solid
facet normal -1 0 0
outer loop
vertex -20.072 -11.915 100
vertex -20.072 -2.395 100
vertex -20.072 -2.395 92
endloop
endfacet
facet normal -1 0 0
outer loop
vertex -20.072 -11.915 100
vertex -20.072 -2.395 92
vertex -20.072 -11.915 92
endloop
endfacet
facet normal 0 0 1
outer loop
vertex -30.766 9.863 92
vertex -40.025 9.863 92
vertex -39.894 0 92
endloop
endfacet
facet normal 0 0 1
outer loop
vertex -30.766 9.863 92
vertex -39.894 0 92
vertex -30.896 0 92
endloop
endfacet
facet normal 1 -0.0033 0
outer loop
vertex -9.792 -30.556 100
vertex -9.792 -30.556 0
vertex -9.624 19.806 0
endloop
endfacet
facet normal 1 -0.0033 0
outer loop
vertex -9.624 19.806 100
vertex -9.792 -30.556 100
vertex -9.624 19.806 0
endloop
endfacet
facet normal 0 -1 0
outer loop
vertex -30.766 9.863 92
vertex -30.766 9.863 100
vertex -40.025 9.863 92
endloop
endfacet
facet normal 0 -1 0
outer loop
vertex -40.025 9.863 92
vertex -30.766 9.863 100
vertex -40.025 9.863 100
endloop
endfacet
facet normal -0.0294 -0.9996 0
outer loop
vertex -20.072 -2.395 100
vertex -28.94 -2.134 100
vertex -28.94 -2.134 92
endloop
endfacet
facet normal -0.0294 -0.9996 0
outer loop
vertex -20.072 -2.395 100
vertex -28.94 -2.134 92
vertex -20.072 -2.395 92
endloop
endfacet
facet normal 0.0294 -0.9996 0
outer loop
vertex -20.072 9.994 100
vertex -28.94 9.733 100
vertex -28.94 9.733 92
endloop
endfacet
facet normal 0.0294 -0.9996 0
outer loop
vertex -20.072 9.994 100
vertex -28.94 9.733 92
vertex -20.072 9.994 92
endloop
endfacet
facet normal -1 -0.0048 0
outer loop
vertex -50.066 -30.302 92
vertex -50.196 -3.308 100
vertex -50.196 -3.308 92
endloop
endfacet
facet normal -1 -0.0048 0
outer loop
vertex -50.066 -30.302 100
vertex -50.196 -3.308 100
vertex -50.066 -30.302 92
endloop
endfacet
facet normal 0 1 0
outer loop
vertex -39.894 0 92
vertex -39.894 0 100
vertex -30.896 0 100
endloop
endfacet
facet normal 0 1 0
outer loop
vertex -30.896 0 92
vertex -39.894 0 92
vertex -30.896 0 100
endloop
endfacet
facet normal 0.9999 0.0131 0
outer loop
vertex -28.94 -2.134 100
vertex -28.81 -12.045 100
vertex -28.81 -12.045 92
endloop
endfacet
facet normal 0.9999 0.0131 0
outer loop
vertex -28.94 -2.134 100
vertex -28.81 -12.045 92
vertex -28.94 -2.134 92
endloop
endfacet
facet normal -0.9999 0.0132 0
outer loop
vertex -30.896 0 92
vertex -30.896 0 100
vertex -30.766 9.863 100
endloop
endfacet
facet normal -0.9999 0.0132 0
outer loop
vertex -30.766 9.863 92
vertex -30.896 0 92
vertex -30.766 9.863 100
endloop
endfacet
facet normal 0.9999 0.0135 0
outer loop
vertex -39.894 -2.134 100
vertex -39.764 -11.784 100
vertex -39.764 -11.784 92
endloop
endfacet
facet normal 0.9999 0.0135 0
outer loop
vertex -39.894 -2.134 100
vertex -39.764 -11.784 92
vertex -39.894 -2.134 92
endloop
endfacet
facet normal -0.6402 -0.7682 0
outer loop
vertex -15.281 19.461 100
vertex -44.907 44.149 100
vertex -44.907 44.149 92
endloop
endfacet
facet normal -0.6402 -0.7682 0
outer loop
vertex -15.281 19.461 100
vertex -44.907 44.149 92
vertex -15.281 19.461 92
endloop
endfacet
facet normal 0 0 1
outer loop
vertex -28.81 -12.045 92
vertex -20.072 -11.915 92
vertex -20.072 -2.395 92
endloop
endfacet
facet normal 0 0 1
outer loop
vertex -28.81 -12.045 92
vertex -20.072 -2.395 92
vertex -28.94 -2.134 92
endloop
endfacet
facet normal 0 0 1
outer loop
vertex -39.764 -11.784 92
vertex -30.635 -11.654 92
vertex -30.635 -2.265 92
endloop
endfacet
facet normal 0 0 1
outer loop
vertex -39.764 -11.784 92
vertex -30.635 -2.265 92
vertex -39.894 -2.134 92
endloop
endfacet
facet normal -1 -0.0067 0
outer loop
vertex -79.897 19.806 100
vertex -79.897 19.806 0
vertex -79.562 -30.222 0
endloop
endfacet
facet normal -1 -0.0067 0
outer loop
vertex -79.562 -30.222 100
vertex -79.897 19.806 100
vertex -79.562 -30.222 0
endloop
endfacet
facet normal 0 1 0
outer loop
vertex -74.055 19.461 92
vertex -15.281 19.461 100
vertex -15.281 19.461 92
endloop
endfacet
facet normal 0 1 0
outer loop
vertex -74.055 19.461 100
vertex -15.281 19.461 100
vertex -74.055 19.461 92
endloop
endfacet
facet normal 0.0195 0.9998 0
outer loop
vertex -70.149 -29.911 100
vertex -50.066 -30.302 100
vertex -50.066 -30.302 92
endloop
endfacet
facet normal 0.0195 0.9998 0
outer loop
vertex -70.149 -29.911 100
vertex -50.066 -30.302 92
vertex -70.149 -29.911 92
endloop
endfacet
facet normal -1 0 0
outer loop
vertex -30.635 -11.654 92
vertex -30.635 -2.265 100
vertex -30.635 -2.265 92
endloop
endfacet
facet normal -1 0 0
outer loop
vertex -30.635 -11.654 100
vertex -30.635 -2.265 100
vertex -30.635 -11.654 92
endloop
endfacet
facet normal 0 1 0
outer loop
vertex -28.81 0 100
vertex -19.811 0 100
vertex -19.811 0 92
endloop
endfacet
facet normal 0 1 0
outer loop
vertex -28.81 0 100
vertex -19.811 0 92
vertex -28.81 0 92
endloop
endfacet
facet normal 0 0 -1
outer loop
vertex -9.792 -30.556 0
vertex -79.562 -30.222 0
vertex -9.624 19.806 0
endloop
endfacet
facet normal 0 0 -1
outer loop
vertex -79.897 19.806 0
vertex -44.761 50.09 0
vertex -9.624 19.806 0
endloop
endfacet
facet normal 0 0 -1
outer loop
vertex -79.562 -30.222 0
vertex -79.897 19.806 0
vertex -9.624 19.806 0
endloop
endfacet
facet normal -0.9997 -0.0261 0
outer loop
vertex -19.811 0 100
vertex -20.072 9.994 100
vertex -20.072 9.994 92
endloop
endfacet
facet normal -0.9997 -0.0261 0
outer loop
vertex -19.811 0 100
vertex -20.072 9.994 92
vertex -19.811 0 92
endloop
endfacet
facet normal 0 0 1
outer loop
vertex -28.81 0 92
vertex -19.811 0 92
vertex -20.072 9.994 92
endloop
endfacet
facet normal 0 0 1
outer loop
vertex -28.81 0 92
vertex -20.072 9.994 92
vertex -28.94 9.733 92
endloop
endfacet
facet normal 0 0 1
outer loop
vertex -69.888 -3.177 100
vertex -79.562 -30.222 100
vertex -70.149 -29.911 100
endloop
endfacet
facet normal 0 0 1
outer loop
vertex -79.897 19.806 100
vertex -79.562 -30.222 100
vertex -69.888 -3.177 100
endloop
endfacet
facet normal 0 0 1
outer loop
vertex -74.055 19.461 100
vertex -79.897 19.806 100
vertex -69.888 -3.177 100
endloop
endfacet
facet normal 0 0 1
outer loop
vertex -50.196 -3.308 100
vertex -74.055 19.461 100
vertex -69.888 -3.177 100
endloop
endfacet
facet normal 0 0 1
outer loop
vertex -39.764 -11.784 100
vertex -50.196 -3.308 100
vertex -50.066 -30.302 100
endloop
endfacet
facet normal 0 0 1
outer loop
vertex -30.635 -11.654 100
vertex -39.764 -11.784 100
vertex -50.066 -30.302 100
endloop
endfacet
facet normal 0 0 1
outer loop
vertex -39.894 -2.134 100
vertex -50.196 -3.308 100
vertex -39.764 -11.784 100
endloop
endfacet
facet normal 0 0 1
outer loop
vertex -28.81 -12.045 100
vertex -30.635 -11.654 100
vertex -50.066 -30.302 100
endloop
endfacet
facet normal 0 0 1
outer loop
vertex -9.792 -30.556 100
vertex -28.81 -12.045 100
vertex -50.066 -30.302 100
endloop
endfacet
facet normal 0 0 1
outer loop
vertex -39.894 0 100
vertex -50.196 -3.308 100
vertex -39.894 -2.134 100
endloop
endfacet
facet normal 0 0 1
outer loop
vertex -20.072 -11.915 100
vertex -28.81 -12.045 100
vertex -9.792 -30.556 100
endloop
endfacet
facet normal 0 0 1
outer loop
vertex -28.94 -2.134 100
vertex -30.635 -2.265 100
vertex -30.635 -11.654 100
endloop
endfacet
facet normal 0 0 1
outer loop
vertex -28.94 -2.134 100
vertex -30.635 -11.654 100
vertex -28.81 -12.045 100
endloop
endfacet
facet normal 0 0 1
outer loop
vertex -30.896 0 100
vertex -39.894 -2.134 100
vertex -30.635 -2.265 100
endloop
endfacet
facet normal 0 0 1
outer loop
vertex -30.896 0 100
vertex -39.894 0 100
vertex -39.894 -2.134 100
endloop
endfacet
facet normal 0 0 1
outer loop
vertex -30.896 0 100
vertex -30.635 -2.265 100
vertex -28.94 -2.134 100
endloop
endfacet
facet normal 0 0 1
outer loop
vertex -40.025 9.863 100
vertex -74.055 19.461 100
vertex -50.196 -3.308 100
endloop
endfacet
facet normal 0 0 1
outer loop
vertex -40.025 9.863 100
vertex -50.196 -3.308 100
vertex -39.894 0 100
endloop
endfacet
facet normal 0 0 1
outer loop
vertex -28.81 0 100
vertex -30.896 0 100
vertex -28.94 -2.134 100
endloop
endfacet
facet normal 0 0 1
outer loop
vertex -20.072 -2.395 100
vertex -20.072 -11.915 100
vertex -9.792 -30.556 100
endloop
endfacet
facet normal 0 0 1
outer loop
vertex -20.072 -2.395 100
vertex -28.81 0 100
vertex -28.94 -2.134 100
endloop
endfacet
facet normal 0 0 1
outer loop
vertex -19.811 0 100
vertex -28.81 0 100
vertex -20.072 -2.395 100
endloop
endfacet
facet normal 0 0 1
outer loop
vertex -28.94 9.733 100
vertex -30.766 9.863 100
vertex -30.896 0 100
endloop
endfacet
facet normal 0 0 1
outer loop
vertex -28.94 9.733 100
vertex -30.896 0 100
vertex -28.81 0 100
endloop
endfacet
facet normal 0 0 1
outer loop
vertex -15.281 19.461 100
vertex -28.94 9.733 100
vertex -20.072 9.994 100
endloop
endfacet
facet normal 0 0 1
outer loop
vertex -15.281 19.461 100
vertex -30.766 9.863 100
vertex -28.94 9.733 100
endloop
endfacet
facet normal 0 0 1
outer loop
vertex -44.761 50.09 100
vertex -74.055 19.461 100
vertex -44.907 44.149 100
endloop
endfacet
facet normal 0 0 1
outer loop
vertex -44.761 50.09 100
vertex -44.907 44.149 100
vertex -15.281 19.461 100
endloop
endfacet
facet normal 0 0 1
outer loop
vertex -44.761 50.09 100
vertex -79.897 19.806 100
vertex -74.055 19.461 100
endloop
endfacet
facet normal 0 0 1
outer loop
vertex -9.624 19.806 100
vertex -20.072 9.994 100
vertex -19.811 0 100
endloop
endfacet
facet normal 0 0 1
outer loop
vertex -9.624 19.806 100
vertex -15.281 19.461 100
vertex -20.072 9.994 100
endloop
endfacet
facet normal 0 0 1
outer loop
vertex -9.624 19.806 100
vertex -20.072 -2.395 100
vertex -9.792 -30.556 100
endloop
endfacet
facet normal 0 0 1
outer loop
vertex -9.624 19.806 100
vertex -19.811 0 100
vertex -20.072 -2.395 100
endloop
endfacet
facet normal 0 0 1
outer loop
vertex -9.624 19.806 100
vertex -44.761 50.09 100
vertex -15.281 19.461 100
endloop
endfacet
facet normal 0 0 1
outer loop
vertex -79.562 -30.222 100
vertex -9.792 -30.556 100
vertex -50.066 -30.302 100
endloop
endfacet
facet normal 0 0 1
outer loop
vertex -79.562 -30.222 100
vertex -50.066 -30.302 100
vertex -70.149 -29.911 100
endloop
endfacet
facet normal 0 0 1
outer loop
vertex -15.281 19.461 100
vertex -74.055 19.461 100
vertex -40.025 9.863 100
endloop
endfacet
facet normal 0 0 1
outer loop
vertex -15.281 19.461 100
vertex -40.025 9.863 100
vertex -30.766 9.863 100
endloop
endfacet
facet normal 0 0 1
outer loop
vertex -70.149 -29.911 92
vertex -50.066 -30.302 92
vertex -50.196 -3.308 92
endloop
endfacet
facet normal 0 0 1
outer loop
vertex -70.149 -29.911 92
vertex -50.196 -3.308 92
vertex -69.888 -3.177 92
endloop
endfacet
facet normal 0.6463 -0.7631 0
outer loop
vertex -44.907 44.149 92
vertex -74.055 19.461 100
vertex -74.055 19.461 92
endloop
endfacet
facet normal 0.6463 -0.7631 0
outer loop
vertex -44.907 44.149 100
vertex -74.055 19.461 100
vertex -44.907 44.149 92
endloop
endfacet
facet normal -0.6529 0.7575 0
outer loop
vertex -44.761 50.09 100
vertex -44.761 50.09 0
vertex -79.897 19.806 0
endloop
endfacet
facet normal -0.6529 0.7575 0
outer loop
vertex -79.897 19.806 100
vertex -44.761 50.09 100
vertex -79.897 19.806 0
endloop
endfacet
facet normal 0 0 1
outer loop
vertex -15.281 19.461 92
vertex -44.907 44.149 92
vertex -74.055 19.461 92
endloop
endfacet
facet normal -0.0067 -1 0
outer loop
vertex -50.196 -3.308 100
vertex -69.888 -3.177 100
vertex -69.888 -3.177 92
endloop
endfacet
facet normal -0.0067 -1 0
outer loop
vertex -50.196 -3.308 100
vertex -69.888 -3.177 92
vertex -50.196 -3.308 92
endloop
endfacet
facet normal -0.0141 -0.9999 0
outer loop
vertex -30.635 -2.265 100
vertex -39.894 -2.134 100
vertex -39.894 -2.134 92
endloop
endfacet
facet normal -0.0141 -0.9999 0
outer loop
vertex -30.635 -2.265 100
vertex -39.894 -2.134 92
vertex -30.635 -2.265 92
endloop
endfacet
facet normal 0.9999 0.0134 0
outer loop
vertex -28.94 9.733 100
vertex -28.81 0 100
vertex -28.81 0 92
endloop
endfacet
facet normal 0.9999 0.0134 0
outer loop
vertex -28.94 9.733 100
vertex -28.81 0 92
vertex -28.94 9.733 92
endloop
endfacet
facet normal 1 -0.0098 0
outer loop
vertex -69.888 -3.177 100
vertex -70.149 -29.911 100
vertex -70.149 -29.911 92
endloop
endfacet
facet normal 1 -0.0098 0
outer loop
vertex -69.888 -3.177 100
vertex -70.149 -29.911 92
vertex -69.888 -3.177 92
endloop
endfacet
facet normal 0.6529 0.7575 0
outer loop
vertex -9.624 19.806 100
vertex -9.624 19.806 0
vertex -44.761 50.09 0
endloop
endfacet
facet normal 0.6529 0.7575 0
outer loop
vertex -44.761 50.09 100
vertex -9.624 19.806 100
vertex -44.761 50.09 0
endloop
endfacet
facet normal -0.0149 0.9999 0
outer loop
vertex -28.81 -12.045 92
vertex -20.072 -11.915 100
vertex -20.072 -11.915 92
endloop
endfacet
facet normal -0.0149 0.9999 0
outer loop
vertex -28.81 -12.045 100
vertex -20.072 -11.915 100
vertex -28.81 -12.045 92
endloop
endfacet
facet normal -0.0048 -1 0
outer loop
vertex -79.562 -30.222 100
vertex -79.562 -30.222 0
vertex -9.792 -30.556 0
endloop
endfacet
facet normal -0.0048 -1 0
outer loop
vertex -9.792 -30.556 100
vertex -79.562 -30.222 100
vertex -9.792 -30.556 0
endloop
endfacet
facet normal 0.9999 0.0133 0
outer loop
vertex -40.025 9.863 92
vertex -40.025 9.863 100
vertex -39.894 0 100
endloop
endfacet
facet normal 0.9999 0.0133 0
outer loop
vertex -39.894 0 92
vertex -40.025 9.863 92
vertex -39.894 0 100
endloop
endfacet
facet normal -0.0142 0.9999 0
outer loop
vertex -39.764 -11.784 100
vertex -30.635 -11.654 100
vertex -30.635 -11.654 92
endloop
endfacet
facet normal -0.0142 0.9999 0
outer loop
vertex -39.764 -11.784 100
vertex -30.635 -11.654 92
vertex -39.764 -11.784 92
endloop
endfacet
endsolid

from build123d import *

# Parameters (mm, degrees)
PAD_DEPTH       = 100
POCKET_DEPTH    = 8
POCKET001_DEPTH = 8


with BuildPart() as part:
    # Sketch → Pad (new body)
    with BuildSketch(Plane.XY):
        Polygon((-79.562302, -30.221603), (-9.79176, -30.556234), (-9.624449, 19.805712), (-44.760693, 50.089813), (-79.896942, 19.805712), align=None)
    extrude(amount=PAD_DEPTH)

    # Sketch001 (on Face7 of Pad) → Pocket (cut)
    with BuildSketch(Plane.XY.offset(100)):
        Polygon((-74.055283, 19.460539), (-44.906891, 44.149063), (-15.280657, 19.460539), align=None)
    extrude(amount=-POCKET_DEPTH, mode=Mode.SUBTRACT)

    # Sketch002 (on Face5 of Pocket) → Pocket001 (cut)
    with BuildSketch(Plane.XY.offset(100)):
        Polygon((-70.148895, -29.911121), (-69.888077, -3.17746), (-50.196453, -3.307868), (-50.066044, -30.302345), align=None)
        Polygon((-40.02462, 9.86335), (-39.894211, 0), (-30.896048, 0), (-30.765642, 9.86335), align=None)
        Polygon((-28.939928, 9.732944), (-20.072174, 9.993761), (-19.811361, 0), (-28.809523, 0), align=None)
        Polygon((-39.894211, -2.134194), (-30.635239, -2.264603), (-30.635239, -11.653986), (-39.763805, -11.784394), align=None)
        Polygon((-28.939928, -2.134194), (-20.072174, -2.395011), (-20.072174, -11.914803), (-28.809523, -12.045211), align=None)
    extrude(amount=-POCKET001_DEPTH, mode=Mode.SUBTRACT)


solid = part.part
